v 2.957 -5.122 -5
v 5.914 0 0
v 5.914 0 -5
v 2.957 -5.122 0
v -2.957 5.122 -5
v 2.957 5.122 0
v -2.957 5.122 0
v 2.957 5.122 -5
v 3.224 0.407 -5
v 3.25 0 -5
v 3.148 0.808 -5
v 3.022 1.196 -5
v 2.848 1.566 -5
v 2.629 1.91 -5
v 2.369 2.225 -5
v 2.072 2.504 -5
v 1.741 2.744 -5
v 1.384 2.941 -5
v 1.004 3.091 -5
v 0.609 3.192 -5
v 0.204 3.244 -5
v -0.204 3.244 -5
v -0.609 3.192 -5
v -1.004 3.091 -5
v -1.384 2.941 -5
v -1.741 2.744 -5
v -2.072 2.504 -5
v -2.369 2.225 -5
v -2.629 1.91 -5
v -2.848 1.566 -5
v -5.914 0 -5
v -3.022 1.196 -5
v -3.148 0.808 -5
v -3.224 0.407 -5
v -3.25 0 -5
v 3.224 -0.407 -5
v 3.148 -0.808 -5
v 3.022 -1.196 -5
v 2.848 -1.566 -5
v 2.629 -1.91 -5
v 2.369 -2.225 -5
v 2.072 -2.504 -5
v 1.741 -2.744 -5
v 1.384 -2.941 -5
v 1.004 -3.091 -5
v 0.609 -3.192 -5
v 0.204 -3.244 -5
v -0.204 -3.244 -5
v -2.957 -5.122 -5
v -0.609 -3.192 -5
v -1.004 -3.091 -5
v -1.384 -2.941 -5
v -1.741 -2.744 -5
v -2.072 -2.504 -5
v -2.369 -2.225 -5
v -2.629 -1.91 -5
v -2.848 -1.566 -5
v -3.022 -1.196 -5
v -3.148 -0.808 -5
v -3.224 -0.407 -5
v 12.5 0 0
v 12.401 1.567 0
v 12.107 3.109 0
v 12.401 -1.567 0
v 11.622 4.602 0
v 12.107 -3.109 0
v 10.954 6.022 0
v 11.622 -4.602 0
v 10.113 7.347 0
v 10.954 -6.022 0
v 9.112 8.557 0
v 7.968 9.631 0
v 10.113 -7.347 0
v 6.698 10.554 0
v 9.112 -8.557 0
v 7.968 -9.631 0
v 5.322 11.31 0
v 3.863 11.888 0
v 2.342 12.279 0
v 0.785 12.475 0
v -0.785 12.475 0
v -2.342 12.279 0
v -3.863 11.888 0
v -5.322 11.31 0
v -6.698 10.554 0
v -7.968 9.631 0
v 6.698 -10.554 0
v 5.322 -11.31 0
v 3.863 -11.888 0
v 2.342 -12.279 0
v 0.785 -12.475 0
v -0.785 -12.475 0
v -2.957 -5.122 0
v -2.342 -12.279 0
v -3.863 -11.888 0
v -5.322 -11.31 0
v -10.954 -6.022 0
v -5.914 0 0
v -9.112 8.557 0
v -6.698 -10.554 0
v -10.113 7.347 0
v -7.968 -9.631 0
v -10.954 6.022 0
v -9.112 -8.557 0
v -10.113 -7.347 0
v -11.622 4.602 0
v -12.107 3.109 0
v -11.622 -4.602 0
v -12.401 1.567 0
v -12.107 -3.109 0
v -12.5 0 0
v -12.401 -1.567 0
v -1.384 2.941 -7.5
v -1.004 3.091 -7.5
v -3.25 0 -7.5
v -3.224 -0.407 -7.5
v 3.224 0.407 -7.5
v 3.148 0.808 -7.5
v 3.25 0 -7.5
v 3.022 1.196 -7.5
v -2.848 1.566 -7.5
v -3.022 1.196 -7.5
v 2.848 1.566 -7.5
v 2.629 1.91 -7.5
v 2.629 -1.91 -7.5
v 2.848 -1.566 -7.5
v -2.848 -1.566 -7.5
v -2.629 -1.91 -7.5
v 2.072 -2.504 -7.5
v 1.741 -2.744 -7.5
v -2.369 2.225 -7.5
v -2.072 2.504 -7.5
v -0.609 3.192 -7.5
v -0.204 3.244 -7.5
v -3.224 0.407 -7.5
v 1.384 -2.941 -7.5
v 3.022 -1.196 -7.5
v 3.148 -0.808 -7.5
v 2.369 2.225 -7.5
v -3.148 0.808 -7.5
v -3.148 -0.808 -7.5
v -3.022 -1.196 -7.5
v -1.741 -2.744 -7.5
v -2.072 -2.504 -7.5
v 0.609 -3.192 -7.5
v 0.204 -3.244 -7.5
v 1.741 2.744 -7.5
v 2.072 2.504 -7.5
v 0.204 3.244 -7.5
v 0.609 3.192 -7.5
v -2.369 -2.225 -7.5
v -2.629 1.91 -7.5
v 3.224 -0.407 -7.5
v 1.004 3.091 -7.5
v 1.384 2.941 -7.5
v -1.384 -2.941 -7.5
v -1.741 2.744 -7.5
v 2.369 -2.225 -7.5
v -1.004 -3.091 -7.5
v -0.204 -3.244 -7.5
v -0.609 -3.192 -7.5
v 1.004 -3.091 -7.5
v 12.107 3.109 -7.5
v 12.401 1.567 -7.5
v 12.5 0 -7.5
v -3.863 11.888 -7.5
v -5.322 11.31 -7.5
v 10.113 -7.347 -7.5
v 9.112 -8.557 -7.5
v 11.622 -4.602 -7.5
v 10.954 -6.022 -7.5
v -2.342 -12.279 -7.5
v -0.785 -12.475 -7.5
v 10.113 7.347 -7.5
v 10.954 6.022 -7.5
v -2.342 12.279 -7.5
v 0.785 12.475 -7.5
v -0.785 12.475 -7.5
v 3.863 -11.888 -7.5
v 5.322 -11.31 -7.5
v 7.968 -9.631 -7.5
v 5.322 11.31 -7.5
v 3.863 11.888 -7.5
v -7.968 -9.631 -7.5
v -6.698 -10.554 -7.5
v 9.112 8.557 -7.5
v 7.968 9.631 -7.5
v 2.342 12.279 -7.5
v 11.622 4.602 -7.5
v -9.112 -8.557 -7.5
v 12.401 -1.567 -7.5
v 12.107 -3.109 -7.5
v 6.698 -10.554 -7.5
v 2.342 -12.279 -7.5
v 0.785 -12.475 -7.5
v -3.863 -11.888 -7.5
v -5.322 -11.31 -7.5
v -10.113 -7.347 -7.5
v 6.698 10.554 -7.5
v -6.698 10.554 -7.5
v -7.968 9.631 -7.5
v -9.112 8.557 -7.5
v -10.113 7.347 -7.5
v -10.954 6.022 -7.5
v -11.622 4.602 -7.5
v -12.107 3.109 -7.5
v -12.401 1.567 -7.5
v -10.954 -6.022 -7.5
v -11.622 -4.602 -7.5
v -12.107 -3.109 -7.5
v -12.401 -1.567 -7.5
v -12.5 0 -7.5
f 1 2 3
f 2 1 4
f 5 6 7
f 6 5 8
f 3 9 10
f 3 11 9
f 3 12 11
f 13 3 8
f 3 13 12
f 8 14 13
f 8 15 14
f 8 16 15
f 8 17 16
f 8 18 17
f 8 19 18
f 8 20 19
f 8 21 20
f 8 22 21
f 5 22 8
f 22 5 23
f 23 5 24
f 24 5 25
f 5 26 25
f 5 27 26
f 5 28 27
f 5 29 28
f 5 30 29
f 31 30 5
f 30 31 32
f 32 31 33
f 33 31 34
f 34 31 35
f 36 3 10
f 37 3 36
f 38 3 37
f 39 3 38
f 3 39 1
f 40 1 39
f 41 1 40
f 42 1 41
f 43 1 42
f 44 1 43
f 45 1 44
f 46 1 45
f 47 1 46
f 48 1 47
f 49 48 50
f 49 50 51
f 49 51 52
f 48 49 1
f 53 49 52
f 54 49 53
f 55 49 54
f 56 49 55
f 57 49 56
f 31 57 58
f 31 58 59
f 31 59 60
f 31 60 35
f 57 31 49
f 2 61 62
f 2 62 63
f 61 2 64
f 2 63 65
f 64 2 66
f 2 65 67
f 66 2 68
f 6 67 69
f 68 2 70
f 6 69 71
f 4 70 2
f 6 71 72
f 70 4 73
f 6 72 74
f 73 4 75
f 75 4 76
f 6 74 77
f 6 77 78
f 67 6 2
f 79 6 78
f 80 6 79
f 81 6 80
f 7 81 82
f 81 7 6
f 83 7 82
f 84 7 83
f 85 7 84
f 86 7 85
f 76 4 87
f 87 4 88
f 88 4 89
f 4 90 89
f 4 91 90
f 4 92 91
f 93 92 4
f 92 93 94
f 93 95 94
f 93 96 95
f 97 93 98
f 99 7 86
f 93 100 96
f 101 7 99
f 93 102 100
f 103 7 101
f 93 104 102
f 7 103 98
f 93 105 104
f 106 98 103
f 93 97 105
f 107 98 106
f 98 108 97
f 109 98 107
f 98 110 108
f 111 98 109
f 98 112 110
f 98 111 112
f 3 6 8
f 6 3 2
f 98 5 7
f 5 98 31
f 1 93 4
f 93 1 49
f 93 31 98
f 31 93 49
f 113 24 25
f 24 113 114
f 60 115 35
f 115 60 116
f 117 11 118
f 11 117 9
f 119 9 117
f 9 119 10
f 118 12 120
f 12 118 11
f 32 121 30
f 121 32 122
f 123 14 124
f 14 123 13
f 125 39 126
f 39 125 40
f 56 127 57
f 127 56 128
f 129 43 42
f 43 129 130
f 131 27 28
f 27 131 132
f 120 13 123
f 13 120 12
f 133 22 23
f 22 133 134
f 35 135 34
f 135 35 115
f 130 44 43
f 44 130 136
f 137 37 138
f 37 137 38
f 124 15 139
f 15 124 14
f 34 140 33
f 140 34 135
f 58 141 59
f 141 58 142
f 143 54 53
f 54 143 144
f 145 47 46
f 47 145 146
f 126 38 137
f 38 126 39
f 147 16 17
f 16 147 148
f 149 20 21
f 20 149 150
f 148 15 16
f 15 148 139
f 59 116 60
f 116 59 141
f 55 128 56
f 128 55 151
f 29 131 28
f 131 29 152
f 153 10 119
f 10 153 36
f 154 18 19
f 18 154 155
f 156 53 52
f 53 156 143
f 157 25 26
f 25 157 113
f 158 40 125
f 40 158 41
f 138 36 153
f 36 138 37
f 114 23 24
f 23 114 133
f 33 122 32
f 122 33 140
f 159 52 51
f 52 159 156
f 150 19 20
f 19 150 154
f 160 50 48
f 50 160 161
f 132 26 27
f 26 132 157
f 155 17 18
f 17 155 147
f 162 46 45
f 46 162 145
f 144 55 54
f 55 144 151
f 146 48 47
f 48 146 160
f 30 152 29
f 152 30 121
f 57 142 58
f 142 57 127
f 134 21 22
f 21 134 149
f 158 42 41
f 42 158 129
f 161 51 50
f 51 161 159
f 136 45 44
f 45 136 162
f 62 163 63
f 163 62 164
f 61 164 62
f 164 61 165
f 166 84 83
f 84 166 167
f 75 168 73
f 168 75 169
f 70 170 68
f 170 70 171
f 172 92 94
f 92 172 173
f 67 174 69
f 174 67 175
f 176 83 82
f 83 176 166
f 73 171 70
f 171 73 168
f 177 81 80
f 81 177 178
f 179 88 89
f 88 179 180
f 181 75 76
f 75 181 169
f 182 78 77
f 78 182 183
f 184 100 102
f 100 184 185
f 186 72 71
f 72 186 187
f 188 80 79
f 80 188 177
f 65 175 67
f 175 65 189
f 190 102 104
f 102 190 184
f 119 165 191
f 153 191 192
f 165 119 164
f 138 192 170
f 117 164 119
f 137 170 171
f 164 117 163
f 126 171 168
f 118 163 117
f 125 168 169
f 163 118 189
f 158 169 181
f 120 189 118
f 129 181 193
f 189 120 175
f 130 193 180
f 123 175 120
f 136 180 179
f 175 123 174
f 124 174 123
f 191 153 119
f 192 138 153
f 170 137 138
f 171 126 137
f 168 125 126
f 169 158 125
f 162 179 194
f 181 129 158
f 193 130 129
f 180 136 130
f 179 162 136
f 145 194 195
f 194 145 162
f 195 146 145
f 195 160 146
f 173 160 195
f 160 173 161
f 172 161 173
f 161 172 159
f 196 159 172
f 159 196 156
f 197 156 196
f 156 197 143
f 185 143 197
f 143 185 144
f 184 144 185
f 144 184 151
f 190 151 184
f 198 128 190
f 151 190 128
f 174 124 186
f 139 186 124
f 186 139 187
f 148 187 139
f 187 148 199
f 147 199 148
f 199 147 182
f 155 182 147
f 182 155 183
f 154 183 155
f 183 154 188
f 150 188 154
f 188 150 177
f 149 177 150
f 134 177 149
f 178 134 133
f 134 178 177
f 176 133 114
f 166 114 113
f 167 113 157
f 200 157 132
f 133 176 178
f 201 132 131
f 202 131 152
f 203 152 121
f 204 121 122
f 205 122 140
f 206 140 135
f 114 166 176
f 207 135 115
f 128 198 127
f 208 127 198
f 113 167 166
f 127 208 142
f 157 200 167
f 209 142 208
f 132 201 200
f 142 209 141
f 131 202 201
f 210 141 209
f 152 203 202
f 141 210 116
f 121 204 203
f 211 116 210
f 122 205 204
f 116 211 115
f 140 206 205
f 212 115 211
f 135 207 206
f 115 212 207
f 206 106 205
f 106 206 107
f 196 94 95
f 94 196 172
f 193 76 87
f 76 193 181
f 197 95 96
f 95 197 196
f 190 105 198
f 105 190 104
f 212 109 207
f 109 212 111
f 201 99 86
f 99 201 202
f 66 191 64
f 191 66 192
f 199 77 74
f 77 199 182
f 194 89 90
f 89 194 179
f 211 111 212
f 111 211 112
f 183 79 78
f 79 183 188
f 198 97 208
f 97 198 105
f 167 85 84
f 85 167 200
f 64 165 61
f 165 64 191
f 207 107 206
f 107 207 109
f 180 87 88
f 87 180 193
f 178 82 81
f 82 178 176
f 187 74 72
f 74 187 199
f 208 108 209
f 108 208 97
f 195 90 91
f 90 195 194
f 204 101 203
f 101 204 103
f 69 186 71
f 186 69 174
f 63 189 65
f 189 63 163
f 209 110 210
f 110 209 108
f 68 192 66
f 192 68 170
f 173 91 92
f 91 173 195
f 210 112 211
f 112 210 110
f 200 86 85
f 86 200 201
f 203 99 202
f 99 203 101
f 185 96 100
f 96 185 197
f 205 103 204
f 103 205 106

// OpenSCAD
$fn = 50;

difference() {
	union() {
		translate(v = [0, 0, -7.5]) {
			cylinder(h = 7.5, r = 12.5);
		}
	}
	union() {
		translate(v = [0, 0, 0]) {
			rotate(a = [0, 0, 0]) {
				difference() {
					union() {
						translate(v = [0, 0, -5]) {
							linear_extrude(height = 5) {
								polygon(points = [[5.914249999999999, 0.0], [2.957125, 5.1218907443321156], [-2.9571249999999982, 5.1218907443321156], [-5.914249999999999, 7.242867331857232e-16], [-2.9571250000000022, -5.121890744332115], [2.9571249999999956, -5.121890744332118]]);
							}
						}
					}
					union();
				}
			}
		}
		#translate(v = [0, 0, -100.0]) {
			cylinder(h = 200, r = 3.25);
		}
	}
}
